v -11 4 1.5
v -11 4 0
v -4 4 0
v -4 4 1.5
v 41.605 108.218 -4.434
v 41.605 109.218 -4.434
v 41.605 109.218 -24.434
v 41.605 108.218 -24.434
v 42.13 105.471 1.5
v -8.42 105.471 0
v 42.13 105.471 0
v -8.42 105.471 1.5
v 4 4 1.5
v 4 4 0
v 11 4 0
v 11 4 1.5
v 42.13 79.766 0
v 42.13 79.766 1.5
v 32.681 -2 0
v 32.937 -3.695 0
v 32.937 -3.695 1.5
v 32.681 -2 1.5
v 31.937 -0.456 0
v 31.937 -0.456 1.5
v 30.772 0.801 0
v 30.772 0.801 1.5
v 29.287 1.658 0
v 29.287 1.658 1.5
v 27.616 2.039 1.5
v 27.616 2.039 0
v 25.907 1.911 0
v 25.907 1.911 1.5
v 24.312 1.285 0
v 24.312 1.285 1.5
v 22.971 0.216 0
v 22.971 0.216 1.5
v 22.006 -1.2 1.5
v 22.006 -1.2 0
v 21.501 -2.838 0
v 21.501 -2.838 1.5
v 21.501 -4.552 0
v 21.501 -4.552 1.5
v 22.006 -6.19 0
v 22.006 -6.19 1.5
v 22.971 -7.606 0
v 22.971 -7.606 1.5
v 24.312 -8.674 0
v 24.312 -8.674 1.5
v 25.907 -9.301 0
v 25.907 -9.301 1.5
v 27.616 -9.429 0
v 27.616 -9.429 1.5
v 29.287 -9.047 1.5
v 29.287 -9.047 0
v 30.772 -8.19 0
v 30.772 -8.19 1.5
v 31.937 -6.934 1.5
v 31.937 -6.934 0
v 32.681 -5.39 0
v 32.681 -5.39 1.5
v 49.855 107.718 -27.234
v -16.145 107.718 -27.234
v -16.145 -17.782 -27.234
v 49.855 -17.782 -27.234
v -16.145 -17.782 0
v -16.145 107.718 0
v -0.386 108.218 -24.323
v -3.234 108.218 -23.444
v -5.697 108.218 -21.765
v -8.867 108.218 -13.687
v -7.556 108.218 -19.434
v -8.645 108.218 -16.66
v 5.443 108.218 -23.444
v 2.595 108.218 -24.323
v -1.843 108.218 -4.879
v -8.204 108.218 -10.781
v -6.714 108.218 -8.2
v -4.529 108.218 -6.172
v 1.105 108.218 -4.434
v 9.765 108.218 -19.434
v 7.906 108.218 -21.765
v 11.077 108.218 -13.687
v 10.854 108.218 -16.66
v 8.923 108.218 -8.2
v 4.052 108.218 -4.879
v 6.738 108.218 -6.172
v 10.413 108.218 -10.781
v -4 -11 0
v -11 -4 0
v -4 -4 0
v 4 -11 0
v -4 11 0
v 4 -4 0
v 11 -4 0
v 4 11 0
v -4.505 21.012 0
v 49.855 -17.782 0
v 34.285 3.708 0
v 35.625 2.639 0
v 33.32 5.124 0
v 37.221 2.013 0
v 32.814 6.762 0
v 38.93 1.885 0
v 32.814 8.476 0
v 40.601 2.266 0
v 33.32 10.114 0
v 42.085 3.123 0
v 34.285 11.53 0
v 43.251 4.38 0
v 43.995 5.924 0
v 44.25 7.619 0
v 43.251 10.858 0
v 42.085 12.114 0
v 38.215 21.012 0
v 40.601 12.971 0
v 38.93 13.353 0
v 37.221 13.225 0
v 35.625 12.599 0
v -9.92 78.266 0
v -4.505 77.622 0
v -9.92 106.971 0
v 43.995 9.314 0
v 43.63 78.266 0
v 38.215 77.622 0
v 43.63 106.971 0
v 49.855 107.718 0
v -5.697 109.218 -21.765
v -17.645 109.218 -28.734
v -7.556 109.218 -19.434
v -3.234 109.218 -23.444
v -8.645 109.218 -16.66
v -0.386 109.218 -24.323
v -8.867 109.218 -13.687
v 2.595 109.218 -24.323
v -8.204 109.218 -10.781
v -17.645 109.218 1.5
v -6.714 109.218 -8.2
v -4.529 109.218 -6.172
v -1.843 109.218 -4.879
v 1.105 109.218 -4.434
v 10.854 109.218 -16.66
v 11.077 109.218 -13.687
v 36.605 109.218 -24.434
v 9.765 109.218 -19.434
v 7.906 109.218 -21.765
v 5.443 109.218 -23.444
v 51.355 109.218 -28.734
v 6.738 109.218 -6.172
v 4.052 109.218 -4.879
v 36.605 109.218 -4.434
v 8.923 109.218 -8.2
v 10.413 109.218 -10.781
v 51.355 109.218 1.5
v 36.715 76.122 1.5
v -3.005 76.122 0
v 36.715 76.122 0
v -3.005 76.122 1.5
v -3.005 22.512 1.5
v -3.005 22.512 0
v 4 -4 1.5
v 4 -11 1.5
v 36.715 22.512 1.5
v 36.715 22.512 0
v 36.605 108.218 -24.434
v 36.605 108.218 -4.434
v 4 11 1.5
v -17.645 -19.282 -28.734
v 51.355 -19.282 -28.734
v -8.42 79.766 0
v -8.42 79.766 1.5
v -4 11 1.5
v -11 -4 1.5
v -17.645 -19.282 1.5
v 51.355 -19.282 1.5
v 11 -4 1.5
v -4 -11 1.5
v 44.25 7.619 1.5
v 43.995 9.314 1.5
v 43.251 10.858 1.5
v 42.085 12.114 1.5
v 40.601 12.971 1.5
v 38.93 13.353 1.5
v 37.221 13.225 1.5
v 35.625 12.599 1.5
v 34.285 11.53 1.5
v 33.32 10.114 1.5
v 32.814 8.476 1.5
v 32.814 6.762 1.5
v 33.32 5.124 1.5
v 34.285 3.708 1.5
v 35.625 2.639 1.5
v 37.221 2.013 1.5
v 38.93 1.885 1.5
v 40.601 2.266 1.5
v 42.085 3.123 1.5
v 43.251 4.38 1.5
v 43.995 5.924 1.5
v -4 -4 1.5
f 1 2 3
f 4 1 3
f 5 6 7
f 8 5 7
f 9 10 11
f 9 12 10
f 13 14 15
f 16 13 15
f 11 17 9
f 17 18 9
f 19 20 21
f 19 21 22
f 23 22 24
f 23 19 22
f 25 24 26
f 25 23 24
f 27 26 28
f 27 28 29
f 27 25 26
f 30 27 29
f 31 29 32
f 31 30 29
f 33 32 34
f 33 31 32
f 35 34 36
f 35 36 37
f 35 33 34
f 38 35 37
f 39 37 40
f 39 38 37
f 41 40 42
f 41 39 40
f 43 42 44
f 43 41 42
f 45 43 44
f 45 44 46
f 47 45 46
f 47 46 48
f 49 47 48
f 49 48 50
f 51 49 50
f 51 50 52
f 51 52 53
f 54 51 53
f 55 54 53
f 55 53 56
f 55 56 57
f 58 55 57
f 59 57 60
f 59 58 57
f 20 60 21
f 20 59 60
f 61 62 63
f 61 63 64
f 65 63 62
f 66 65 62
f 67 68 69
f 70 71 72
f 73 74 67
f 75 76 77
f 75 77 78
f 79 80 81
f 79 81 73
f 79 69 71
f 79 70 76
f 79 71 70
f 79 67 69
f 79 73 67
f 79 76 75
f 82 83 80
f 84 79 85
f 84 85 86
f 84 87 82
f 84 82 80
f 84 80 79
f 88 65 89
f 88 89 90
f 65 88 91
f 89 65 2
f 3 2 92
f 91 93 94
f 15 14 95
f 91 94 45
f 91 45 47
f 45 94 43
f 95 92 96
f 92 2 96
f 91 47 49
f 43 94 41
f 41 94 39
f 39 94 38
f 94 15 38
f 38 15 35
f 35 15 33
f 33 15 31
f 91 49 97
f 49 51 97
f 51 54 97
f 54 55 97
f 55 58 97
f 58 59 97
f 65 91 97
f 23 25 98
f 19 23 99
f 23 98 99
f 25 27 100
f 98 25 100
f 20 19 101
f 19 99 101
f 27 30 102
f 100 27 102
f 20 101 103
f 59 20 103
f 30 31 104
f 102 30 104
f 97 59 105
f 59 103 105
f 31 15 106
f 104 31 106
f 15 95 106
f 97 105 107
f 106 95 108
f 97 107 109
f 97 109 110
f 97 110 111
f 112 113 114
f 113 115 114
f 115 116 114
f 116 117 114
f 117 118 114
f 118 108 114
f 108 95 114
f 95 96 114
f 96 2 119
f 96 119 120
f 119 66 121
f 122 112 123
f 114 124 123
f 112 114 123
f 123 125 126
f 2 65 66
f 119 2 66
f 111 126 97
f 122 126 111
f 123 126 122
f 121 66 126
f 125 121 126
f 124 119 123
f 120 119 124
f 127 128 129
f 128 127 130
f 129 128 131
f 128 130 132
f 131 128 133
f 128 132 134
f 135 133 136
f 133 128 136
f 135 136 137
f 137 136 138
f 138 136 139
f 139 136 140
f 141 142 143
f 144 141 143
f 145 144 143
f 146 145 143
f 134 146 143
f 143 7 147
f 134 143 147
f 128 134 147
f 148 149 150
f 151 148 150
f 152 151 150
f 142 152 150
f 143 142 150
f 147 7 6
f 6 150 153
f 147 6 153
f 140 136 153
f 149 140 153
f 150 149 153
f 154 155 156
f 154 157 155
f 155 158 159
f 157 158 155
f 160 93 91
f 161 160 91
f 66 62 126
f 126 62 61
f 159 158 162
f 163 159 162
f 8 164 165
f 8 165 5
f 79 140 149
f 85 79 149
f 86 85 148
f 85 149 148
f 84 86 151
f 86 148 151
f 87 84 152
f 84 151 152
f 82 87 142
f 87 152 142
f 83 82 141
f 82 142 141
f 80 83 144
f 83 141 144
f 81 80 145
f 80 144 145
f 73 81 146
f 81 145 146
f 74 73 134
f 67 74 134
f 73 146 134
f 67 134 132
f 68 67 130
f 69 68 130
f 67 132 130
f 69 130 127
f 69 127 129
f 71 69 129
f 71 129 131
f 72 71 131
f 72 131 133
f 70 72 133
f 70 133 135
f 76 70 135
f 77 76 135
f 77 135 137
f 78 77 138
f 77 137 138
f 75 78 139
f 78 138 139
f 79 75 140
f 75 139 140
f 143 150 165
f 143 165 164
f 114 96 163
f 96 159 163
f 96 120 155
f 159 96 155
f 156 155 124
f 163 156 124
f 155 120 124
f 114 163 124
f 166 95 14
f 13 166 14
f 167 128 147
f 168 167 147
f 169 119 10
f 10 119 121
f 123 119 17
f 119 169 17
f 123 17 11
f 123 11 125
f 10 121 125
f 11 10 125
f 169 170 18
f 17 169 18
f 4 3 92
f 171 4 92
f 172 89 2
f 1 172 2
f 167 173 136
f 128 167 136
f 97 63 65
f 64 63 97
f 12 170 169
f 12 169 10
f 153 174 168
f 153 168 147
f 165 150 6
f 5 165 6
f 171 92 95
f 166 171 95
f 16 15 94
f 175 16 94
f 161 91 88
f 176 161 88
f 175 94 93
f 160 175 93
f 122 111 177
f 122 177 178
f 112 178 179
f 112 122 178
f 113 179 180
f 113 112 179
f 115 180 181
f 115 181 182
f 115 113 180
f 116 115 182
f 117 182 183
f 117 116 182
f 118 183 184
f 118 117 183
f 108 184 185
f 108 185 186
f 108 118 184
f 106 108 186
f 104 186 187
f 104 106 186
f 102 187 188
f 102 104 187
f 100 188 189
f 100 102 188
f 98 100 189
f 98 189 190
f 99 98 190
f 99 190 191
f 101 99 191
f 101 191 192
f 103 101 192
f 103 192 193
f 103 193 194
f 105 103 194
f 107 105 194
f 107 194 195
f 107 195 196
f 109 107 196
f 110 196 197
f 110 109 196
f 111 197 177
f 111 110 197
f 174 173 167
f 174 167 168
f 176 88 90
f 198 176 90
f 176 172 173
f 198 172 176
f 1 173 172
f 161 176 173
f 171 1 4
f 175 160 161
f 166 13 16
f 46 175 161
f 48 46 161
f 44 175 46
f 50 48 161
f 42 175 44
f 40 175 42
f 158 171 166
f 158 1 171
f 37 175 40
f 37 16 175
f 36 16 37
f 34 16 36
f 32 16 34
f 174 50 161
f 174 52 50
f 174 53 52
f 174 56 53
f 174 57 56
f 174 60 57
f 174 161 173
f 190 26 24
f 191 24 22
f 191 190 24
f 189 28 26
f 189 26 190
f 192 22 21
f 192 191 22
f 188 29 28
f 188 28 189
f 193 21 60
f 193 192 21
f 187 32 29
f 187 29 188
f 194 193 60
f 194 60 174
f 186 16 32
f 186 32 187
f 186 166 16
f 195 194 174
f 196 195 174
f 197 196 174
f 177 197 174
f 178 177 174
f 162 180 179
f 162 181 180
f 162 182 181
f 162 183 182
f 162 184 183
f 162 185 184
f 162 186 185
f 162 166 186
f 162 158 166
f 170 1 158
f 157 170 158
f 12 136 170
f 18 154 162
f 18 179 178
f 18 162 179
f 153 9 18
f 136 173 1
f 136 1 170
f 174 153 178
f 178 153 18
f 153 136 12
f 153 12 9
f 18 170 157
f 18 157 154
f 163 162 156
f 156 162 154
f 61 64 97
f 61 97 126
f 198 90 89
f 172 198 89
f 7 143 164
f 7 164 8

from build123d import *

# Parameters (mm, degrees)
SKETCH1_W           = 66
SKETCH1_H           = 125.5
SKETCH1_R           = 5.75
SKETCH1_W_2         = 50.55
SKETCH1_H_2         = 25.705
SKETCH1_W_3         = 39.72
SKETCH1_H_3         = 53.61
SKETCH1_W_4         = 42.72
SKETCH1_H_4         = 56.61
SKETCH1_W_5         = 53.55
SKETCH1_H_5         = 28.705
BOSS_EXTRUDE1_DEPTH = 1.5
SKETCH1_3_W         = 42.72
SKETCH1_3_H         = 56.61
SKETCH1_3_W_2       = 39.72
SKETCH1_3_H_2       = 53.61
BOSS_EXTRUDE2_DEPTH = 0.000481454
SKETCH1_4_W         = 53.55
SKETCH1_4_H         = 28.705
SKETCH1_4_W_2       = 50.55
SKETCH1_4_H_2       = 25.705
BOSS_EXTRUDE3_DEPTH = 0.000481454
BOSS_EXTRUDE4_START = -27.234481
SKETCH1_5_W         = 69
SKETCH1_5_H         = 128.5
SKETCH1_5_W_2       = 66
SKETCH1_5_H_2       = 125.5
BOSS_EXTRUDE4_DEPTH = 28.734481
BOSS_EXTRUDE5_START = -27.234481
SKETCH1_6_W         = 69
SKETCH1_6_H         = 128.5
BOSS_EXTRUDE5_DEPTH = 1.5
SKETCH2_R           = 10
SKETCH2_W           = 5
SKETCH2_H           = 20
CUT_EXTRUDE1_DEPTH  = 1


with BuildPart() as part:
    # Sketch1 → Boss-Extrude1 (new body)
    # profile 1 of 3: a face of its own
    with BuildSketch(Plane.XY):
        with Locations((16.854577092, 44.967543122)):
            Rectangle(SKETCH1_W, SKETCH1_H)
        with Locations((38.500244774, 7.618926737)):
            Circle(SKETCH1_R, mode=Mode.SUBTRACT)
        with Locations((27.186536275, -3.694781762)):
            Circle(SKETCH1_R, mode=Mode.SUBTRACT)
        with Locations((16.854577092, 92.618043122)):
            Rectangle(SKETCH1_W_2, SKETCH1_H_2, mode=Mode.SUBTRACT)
        with Locations((16.854577092, 49.317142331)):
            Rectangle(SKETCH1_W_3, SKETCH1_H_3, mode=Mode.SUBTRACT)
        Polygon((4, -11), (-4, -11), (-4, -4), (-11, -4), (-11, 4), (-4, 4), (-4, 11), (4, 11), (4, 4), (11, 4), (11, -4), (4, -4), align=None, mode=Mode.SUBTRACT)
    # profile 2 of 3: a face of its own
    with BuildSketch(Plane.XY):
        with Locations((16.854577092, 49.317142331)):
            Rectangle(SKETCH1_W_4, SKETCH1_H_4)
        with Locations((16.854577092, 49.317142331)):
            Rectangle(SKETCH1_W_3, SKETCH1_H_3, mode=Mode.SUBTRACT)
    # profile 3 of 3: a face of its own
    with BuildSketch(Plane.XY):
        with Locations((16.854577092, 92.618043122)):
            Rectangle(SKETCH1_W_5, SKETCH1_H_5)
        with Locations((16.854577092, 92.618043122)):
            Rectangle(SKETCH1_W_2, SKETCH1_H_2, mode=Mode.SUBTRACT)
    extrude(amount=BOSS_EXTRUDE1_DEPTH)

    # Sketch1<3> → Boss-Extrude2 (add)
    with BuildSketch(Plane.XY):
        with Locations((16.854577092, 49.317142331)):
            Rectangle(SKETCH1_3_W, SKETCH1_3_H)
        with Locations((16.854577092, 49.317142331)):
            Rectangle(SKETCH1_3_W_2, SKETCH1_3_H_2, mode=Mode.SUBTRACT)
    extrude(amount=-BOSS_EXTRUDE2_DEPTH)

    # Sketch1<4> → Boss-Extrude3 (add)
    with BuildSketch(Plane.XY):
        with Locations((16.854577092, 92.618043122)):
            Rectangle(SKETCH1_4_W, SKETCH1_4_H)
        with Locations((16.854577092, 92.618043122)):
            Rectangle(SKETCH1_4_W_2, SKETCH1_4_H_2, mode=Mode.SUBTRACT)
    extrude(amount=-BOSS_EXTRUDE3_DEPTH)

    # Sketch1<5> → Boss-Extrude4 (add)
    with BuildSketch(Plane.XY.offset(BOSS_EXTRUDE4_START)):
        with Locations((16.854577092, 44.967543122)):
            Rectangle(SKETCH1_5_W, SKETCH1_5_H)
        with Locations((16.854577092, 44.967543122)):
            Rectangle(SKETCH1_5_W_2, SKETCH1_5_H_2, mode=Mode.SUBTRACT)
    extrude(amount=BOSS_EXTRUDE4_DEPTH)

    # Sketch1<6> → Boss-Extrude5 (add)
    with BuildSketch(Plane.XY.offset(BOSS_EXTRUDE5_START)):
        with Locations((16.854577092, 44.967543122)):
            Rectangle(SKETCH1_6_W, SKETCH1_6_H)
    extrude(amount=-BOSS_EXTRUDE5_DEPTH)

    # Sketch2 → Cut-Extrude1 (cut)
    with BuildSketch(Plane(origin=(0, 109.217543122, 0), x_dir=(1, 0, 0), z_dir=(0, 1, 0))):
        with Locations(Location((1.104577092, 14.434481454, 0), (0, 0, 270))):
            Circle(SKETCH2_R)
        with Locations((39.104577092, 14.434481454)):
            Rectangle(SKETCH2_W, SKETCH2_H)
    extrude(amount=-CUT_EXTRUDE1_DEPTH, mode=Mode.SUBTRACT)


solid = part.part
